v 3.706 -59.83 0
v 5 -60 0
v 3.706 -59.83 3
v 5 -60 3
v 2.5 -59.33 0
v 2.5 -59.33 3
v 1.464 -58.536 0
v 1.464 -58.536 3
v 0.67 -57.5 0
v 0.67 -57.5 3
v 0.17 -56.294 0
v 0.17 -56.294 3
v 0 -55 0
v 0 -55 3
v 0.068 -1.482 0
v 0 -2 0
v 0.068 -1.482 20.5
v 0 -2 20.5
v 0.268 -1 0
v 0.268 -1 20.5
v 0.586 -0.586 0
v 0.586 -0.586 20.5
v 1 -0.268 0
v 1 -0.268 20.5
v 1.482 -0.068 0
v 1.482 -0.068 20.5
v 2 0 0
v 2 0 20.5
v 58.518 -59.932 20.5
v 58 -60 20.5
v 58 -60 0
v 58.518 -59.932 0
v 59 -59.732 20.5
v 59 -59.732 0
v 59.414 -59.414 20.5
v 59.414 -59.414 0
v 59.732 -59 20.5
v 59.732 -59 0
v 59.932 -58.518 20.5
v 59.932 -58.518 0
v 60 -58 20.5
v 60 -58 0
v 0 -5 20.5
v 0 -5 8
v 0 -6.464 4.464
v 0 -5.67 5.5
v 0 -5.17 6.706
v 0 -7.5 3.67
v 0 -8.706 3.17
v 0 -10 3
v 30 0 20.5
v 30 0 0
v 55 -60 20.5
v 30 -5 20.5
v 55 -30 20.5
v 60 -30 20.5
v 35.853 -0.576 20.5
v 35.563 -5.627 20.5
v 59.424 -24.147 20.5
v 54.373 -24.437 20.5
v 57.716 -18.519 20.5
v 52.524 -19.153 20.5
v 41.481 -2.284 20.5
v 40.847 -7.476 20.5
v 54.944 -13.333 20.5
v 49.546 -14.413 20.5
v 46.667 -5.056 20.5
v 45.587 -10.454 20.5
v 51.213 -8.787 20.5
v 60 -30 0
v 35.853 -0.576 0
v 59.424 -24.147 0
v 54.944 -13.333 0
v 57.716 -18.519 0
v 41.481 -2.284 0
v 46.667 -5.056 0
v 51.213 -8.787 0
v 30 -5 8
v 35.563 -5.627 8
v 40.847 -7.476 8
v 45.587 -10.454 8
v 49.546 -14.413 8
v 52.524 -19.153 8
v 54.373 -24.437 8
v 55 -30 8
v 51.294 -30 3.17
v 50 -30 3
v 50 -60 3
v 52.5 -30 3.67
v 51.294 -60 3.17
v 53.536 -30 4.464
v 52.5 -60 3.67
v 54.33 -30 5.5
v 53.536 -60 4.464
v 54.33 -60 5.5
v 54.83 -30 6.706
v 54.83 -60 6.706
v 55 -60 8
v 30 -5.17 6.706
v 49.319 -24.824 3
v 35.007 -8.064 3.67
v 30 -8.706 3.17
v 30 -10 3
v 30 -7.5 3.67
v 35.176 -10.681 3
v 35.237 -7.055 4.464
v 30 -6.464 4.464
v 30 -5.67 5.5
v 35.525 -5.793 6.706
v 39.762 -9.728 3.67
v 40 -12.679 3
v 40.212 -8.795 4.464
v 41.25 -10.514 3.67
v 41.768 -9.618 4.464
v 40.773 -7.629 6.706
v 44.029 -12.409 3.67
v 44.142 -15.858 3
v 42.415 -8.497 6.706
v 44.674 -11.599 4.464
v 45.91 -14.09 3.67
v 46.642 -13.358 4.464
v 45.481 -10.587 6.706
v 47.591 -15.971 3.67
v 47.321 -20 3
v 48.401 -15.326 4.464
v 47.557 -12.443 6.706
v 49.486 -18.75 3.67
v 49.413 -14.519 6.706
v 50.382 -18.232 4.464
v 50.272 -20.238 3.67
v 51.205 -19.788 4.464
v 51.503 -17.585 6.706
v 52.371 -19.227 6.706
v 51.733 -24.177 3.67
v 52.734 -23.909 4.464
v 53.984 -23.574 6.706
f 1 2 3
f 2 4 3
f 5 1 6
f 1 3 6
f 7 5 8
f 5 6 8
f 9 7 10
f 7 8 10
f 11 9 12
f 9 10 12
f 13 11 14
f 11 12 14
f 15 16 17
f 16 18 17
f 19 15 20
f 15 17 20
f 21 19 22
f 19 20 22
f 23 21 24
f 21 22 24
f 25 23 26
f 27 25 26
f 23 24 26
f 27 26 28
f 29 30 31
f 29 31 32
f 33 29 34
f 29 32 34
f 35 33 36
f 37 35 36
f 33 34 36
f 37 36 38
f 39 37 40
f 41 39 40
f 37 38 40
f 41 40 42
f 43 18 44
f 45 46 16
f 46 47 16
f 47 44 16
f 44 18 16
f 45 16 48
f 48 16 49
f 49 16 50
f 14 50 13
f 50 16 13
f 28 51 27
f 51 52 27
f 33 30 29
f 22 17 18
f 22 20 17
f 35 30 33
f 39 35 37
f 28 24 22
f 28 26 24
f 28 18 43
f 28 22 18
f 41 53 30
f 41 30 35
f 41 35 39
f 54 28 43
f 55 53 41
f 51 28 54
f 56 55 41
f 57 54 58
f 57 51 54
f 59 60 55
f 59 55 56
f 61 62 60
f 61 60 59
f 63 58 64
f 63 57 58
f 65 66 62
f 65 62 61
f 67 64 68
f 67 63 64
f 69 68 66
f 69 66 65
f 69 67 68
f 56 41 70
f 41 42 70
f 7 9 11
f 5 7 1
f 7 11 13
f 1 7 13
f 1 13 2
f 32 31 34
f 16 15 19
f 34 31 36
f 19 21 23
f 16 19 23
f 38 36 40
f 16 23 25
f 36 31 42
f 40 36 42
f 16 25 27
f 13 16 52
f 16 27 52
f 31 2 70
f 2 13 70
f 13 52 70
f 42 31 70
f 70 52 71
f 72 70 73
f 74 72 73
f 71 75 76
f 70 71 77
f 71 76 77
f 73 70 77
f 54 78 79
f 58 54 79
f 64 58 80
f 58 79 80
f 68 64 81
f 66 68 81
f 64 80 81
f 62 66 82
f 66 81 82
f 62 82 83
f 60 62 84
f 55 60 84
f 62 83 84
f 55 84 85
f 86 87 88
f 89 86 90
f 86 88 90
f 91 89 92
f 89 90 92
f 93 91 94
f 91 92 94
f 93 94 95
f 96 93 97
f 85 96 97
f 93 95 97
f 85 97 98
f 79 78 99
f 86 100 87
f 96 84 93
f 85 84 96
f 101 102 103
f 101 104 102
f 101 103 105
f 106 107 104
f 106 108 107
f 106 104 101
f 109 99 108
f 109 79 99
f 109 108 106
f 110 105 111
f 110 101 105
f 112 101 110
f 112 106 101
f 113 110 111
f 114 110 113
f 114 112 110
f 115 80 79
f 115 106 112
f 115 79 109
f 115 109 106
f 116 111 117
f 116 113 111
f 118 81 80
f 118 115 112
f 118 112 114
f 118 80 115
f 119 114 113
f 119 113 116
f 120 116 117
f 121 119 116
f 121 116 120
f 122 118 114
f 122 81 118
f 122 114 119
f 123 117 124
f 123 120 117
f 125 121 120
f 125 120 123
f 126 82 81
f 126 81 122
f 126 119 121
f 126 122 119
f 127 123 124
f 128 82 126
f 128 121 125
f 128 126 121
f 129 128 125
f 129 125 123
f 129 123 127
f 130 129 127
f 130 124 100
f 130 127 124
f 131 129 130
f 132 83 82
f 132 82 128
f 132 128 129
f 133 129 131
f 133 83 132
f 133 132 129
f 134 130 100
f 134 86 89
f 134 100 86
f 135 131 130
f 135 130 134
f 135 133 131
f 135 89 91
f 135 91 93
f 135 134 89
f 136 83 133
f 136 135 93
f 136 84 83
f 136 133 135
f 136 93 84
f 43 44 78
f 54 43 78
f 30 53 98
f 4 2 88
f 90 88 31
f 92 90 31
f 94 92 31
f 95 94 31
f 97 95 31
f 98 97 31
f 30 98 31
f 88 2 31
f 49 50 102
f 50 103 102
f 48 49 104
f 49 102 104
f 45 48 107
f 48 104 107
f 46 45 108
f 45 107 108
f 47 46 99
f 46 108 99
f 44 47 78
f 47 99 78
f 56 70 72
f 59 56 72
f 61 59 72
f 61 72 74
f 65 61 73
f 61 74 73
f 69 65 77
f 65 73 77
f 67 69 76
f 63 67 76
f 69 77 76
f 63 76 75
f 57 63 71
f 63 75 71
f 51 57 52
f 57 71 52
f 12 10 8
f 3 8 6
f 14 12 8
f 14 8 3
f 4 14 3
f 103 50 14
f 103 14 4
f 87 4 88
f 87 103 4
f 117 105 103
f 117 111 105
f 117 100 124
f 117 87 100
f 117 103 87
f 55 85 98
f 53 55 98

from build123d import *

# Parameters (mm, degrees)
F1_DEPTH = 3
F3_DEPTH = 17.5
F4_R     = 5
F5_R     = 2
F6_R     = 2
F7_R     = 5


with BuildPart() as f1:
    # F0 (on Top) → F1 (new body)
    with BuildSketch(Plane.XY):
        with BuildLine():
            Line((30, 0), (0, 0))
            Line((0, 0), (0, -60))
            Line((0, -60), (60, -60))
            Line((60, -60), (60, -30))
            ThreePointArc((60, -30), (51.2132034356, -8.7867965644), (30, 0))
        make_face()
    extrude(amount=F1_DEPTH)

    # F2 (on face) → F3 (join)
    with BuildSketch(Plane.XY.offset(3)):
        with BuildLine():
            Line((30, 0), (0, 0))
            Line((0, 0), (0, -5))
            Line((0, -5), (30, -5))
            ThreePointArc((30, -5), (47.6776695297, -12.3223304703), (55, -30))
            Line((55, -30), (55, -60))
            Line((55, -60), (60, -60))
            Line((60, -60), (60, -30))
            ThreePointArc((60, -30), (51.2132034356, -8.7867965644), (30, 0))
        make_face()
    extrude(amount=F3_DEPTH)

    # F4
    f4_edges = [f1.edges().sort_by_distance(p)[0] for p in [
        (0, -60, 1.5),
    ]]
    fillet(f4_edges, radius=F4_R)

    # F5
    f5_edges = [f1.edges().sort_by_distance(p)[0] for p in [
        (0, 0, 10.25),
    ]]
    fillet(f5_edges, radius=F5_R)

    # F6
    f6_edges = [f1.edges().sort_by_distance(p)[0] for p in [
        (60, -60, 10.25),
    ]]
    fillet(f6_edges, radius=F6_R)

    # F7
    f7_edges = [f1.edges().sort_by_distance(p)[0] for p in [
        (15, -5, 3),
        (47.67767, -12.32233, 3),
        (55, -45, 3),
    ]]
    fillet(f7_edges, radius=F7_R)


solid = f1.part
